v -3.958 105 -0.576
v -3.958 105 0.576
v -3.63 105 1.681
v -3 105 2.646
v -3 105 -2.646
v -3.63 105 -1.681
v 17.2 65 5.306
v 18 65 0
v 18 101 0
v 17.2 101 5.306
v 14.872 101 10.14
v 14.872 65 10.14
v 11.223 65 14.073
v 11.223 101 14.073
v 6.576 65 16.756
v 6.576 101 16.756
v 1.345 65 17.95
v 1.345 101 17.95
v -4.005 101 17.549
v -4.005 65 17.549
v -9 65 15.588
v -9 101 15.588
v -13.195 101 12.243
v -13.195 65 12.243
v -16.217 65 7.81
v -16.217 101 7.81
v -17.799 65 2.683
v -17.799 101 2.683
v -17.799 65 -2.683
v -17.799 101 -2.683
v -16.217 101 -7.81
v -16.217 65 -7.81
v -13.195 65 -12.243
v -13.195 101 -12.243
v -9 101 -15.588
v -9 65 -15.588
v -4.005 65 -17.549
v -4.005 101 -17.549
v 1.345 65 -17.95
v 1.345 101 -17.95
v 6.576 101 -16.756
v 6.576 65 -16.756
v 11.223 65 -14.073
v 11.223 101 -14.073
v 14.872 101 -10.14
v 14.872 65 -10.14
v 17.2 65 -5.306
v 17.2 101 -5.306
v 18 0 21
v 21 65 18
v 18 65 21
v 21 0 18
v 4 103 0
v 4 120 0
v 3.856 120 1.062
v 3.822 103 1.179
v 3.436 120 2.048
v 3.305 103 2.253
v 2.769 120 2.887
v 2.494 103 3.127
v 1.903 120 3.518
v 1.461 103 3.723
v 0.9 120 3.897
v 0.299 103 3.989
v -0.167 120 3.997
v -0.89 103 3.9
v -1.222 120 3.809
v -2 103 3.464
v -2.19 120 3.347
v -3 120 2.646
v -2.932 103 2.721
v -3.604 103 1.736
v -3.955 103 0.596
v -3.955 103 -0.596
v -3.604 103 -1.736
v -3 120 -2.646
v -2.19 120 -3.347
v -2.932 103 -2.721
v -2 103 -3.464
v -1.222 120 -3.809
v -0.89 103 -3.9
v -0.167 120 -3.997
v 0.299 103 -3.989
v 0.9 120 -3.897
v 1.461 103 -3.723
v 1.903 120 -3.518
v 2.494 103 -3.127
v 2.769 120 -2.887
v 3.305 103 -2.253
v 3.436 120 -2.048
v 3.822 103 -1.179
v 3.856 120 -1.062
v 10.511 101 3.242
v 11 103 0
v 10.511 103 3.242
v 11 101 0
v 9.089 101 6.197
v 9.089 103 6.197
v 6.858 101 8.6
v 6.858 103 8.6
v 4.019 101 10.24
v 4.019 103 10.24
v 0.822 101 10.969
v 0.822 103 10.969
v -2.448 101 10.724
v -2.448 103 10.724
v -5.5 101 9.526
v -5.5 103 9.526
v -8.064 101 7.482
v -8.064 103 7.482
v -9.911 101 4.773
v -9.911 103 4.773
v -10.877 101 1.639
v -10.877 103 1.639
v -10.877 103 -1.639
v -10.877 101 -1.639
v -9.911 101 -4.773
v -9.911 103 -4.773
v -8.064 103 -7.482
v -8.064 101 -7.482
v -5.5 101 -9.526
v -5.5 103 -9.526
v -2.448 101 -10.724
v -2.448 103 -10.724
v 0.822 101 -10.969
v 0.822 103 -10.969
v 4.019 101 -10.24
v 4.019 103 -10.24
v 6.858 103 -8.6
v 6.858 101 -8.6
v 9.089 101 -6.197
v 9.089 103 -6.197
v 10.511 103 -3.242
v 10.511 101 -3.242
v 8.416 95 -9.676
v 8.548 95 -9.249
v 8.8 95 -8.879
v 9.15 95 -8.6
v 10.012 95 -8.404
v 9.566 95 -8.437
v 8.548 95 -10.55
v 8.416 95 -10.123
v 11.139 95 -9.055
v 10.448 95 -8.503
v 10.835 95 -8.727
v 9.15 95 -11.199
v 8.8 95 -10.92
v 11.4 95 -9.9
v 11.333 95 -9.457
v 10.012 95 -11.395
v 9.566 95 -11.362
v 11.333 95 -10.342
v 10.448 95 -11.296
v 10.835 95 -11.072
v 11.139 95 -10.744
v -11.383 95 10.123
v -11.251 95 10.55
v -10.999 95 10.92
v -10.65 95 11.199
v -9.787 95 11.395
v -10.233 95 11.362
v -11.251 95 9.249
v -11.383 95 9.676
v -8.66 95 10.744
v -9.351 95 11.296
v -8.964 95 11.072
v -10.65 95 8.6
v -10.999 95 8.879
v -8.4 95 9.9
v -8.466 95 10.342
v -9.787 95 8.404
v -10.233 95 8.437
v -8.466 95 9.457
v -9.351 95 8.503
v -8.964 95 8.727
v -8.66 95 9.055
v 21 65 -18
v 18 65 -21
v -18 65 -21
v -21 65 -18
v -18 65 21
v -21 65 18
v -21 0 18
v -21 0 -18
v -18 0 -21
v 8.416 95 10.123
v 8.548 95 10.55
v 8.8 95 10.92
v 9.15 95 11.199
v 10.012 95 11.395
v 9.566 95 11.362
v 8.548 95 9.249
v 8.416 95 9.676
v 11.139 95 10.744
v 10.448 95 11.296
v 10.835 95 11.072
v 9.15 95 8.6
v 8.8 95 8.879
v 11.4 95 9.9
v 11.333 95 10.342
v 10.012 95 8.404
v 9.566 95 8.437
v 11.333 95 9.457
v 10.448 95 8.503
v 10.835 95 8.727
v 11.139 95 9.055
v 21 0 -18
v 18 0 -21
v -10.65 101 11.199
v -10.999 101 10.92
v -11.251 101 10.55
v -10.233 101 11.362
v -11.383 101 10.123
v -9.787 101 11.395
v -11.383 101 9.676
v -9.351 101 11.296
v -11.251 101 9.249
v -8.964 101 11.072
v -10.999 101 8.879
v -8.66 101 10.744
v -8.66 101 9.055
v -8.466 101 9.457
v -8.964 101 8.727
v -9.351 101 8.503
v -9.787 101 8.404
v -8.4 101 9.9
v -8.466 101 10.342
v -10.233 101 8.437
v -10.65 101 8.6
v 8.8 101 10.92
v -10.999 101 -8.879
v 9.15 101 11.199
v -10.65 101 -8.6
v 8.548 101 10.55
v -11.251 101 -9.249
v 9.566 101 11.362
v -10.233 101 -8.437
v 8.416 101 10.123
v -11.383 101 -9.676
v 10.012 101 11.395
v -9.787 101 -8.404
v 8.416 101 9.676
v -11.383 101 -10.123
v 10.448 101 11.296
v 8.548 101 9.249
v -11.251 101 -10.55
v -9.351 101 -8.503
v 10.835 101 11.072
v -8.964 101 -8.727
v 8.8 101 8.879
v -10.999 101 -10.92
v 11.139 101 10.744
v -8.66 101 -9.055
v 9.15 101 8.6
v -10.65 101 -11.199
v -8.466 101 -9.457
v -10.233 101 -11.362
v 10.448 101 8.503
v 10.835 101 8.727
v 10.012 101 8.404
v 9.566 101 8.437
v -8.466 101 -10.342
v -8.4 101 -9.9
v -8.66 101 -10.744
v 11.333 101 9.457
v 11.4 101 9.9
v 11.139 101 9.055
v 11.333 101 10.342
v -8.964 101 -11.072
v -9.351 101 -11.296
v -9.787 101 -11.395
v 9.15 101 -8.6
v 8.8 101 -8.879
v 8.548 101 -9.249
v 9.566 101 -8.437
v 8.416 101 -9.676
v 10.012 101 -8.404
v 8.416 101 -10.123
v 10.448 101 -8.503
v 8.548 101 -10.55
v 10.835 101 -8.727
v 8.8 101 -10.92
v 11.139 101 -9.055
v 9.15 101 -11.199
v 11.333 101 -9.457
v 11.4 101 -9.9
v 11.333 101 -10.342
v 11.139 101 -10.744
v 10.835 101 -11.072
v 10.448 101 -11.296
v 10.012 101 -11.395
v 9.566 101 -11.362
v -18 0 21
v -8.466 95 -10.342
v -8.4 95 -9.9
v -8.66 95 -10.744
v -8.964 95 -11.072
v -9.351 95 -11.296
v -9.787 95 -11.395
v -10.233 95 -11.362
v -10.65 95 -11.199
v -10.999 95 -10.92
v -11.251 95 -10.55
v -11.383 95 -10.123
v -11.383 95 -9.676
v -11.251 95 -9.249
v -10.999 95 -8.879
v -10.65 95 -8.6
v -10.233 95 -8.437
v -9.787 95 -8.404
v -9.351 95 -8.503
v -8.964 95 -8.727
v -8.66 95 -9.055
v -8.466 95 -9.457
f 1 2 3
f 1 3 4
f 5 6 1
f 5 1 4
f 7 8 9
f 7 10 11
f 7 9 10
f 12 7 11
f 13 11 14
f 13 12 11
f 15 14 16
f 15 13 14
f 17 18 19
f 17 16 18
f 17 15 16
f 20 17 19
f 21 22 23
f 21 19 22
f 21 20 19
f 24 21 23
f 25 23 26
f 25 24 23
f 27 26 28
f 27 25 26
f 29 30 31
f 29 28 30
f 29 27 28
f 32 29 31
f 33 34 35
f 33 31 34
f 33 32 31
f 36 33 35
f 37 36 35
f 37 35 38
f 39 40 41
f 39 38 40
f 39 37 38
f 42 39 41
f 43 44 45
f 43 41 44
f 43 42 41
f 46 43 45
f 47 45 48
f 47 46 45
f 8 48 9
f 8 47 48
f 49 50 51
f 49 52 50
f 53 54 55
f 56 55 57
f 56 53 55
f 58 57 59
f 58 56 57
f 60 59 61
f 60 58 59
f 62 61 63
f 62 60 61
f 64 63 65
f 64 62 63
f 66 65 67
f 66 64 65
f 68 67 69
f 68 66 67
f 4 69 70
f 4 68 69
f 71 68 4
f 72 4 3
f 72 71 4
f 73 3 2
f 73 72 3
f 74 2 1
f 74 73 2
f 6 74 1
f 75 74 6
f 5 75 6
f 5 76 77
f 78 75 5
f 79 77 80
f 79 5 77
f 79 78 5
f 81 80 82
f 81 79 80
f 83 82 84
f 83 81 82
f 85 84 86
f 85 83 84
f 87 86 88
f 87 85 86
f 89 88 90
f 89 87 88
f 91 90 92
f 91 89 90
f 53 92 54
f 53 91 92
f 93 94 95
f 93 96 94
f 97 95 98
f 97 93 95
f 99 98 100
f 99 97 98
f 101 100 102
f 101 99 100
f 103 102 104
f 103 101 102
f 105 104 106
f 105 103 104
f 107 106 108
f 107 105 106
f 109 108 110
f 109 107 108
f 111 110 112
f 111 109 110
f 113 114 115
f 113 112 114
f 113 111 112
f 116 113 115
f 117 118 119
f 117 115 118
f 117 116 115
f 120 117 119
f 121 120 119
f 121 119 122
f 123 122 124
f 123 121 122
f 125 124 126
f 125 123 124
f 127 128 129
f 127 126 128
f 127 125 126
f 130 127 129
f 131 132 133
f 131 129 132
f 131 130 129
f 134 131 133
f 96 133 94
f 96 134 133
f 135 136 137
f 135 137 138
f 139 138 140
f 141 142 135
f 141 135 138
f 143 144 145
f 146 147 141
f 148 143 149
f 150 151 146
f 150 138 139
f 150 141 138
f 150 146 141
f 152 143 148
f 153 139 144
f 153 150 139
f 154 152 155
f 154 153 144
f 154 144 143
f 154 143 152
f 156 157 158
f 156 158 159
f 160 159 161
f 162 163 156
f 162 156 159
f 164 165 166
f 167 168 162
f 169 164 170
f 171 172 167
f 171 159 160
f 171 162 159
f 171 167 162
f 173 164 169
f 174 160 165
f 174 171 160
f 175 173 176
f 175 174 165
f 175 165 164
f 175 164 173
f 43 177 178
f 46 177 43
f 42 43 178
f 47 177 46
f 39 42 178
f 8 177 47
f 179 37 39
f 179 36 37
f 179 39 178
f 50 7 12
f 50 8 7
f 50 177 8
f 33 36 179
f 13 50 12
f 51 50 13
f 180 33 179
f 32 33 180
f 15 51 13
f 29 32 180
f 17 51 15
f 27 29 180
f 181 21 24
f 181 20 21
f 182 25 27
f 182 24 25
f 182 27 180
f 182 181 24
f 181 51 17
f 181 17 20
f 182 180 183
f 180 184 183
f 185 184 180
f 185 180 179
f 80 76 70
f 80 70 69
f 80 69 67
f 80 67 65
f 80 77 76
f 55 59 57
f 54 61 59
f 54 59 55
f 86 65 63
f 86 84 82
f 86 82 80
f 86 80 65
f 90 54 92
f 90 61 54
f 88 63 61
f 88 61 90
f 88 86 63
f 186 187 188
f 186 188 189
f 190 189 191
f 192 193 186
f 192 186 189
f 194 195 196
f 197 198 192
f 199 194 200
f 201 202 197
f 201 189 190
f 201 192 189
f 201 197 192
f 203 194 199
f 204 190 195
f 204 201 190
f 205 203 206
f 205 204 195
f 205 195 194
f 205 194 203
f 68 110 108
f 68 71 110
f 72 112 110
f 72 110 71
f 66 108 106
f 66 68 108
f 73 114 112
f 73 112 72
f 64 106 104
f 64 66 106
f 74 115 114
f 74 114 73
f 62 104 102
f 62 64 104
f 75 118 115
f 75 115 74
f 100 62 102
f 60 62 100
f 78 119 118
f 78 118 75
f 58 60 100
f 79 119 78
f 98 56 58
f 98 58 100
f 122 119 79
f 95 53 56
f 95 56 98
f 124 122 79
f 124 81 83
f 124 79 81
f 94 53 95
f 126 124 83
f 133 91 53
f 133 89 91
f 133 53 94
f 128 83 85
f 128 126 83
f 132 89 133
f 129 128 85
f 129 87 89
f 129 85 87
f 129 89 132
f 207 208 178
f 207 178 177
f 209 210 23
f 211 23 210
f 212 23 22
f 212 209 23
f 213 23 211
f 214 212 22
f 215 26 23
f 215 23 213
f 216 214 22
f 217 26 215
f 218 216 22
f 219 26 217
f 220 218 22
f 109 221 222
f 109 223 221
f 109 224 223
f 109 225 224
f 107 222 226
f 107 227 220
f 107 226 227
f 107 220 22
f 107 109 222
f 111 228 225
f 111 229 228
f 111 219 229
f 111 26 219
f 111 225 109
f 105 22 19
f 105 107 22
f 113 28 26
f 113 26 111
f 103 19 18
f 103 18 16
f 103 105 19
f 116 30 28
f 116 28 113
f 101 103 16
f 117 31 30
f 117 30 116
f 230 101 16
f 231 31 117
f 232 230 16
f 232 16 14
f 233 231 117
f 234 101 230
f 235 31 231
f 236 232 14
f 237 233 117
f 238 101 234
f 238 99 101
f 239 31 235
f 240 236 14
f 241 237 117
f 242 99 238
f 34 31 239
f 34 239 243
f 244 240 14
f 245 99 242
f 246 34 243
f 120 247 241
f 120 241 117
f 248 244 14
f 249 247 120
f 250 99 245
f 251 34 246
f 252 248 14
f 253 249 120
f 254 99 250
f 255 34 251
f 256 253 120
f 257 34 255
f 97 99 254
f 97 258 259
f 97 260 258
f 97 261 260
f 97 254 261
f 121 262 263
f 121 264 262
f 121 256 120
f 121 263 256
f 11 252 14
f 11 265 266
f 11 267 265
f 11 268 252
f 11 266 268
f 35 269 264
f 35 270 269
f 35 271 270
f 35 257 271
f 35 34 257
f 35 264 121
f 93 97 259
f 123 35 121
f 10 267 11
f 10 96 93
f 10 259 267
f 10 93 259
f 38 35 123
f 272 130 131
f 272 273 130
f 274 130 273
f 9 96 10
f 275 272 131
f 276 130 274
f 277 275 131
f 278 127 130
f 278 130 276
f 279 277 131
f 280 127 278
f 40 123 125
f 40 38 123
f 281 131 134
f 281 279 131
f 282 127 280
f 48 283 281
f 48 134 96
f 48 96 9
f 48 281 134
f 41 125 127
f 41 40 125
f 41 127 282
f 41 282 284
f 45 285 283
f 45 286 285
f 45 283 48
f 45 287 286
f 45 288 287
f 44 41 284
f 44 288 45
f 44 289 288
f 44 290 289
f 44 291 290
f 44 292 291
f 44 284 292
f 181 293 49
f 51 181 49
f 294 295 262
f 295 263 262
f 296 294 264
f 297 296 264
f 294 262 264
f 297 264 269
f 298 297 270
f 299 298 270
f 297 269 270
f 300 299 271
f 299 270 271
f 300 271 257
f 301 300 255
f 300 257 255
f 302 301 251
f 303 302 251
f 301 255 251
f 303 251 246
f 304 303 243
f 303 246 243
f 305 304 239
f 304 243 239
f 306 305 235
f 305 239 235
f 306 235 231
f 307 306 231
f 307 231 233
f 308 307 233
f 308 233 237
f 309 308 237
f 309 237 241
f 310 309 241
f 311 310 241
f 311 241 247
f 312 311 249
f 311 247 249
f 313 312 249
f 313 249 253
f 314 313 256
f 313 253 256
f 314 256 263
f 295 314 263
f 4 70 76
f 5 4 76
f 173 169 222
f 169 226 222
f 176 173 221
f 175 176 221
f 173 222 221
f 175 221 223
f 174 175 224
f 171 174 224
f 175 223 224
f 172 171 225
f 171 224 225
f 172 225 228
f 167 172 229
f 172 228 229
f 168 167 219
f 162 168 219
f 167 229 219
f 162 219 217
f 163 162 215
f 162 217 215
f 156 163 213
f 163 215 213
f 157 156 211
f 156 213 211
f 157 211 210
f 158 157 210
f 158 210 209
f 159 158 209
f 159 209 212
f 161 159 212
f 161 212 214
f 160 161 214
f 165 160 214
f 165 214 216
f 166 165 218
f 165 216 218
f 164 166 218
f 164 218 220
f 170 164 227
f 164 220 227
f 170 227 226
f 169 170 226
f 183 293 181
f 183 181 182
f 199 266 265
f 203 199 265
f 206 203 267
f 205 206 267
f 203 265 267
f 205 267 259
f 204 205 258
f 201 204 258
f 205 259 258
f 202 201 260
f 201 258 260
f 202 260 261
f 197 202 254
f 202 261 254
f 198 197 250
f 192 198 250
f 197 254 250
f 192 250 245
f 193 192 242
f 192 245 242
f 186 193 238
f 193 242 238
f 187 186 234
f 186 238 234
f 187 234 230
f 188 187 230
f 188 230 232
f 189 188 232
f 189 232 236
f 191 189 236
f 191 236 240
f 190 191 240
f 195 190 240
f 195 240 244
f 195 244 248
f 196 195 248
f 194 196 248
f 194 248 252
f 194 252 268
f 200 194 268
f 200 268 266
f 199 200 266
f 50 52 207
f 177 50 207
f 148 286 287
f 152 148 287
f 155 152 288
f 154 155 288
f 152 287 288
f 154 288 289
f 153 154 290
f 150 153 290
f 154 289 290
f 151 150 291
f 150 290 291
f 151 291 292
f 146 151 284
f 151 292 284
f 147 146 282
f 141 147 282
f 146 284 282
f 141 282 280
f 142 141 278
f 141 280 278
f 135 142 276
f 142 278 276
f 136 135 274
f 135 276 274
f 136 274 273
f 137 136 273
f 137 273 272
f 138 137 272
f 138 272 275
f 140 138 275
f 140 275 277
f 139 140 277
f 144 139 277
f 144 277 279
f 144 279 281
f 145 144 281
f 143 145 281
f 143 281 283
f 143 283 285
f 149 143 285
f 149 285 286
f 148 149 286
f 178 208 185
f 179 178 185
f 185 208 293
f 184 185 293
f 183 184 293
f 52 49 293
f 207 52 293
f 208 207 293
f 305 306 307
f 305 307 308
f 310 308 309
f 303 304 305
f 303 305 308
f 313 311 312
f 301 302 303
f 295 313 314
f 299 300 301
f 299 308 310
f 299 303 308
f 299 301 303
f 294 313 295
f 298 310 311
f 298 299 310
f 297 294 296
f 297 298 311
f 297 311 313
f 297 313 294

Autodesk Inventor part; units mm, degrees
ref_plane "YZ Plane" through (0, 0, 0) normal (1, 0, 0) x (0, 1, 0)
ref_plane "XZ Plane" through (0, 0, 0) normal (0, 1, 0) x (-1, 0, 0)
ref_plane "XY Plane" through (0, 0, 0) normal (0, 0, 1) x (1, 0, 0)
sketch "草圖1" plane through (0, 0, 0) normal (0, 1, 0) x (-1, 0, 0)
  line L0 (18, 21) -> (-18, 21)
  line L1 (-21, 18) -> (-21, -18)
  line L2 (-18, -21) -> (18, -21)
  line L3 (21, -18) -> (21, 18)
  line L4 (21, 21) -> (-21, -21) construction
  line L5 (-21, 21) -> (21, -21) construction
  line L6 (21, -18) -> (18, -21)
  line L7 (-18, -21) -> (-21, -18)
  line L8 (-21, 18) -> (-18, 21)
  line L9 (18, 21) -> (21, 18)
  point P0 (0, 0)
  dimension "d0" = 42
  dimension "d1" = 42
  dimension "d2" = 3
  dimension "d3" = 3
  dimension "d4" = 3
  dimension "d5" = 3
  dimension "d6" = 3
  dimension "d7" = 3
  dimension "d8" = 3
  dimension "d9" = 3
extrude "擠出1" add sketch "草圖1" along normal blind 65
sketch "草圖2" plane through (0, 65, 0) normal (0, 1, 0) x (1, 0, 0)
  circle A0 centre (0, 0) radius 18
  dimension "d12" = 36
extrude "擠出2" add sketch "草圖2" along normal blind 36
sketch "草圖3" plane through (0, 101, 0) normal (0, 1, 0) x (1, 0, 0)
  circle A0 centre (0, 0) radius 14 construction
  circle A1 centre (0, 0) radius 11
  line L0 (0, 0) -> (-19.5, -19.5) construction
  line L1 (-21, -18) -> (-18, -21) projected
  circle A2 centre (-9.8995, -9.8995) radius 1.5
  circle A3 centre (9.8995, -9.8995) radius 1.5
  circle A4 centre (9.8995, 9.8995) radius 1.5
  circle A5 centre (-9.8995, 9.8995) radius 1.5
  dimension "d15" = 28
  dimension "d16" = 22
  dimension "d18" = 3
  dimension "d21" = 360
extrude "擠出3" cut sketch "草圖3" against normal blind 6 contours A2 | A3 | A4 | A5
extrude "擠出4" add sketch "草圖3" along normal blind 2 contours A1
sketch "草圖4" plane through (0, 103, 0) normal (0, 1, 0) x (1, 0, 0)
  circle A0 centre (0, 0) radius 4
  dimension "d27" = 8
extrude "擠出5" add sketch "草圖4" along normal blind 17
sketch "草圖5" plane through (0, 120, 0) normal (0, 1, 0) x (1, 0, 0)
  circle A0 centre (0, 0) radius 4 projected
  line L0 (-3, -2.6458) -> (-3, 2.6458)
  dimension "d30" = 7
extrude "擠出6" cut sketch "草圖5" against normal blind 15 contours L0 A0 picked at (-3.1815, -0.6179)
sketch "草圖7" plane through (0, 0, 0) normal (0, -1, 0) x (1, 0, 0)
  point P0 (0, 0)
  point P1 (0, 0)
equation "\"d3\" = d2"
equation "\"d4\" = d2"
equation "\"d5\" = d4"
equation "\"d6\" = d2"
equation "\"d7\" = d6"
equation "\"d8\" = d2"
equation "\"d9\" = d8"
properties part number "stepper 42-27"
